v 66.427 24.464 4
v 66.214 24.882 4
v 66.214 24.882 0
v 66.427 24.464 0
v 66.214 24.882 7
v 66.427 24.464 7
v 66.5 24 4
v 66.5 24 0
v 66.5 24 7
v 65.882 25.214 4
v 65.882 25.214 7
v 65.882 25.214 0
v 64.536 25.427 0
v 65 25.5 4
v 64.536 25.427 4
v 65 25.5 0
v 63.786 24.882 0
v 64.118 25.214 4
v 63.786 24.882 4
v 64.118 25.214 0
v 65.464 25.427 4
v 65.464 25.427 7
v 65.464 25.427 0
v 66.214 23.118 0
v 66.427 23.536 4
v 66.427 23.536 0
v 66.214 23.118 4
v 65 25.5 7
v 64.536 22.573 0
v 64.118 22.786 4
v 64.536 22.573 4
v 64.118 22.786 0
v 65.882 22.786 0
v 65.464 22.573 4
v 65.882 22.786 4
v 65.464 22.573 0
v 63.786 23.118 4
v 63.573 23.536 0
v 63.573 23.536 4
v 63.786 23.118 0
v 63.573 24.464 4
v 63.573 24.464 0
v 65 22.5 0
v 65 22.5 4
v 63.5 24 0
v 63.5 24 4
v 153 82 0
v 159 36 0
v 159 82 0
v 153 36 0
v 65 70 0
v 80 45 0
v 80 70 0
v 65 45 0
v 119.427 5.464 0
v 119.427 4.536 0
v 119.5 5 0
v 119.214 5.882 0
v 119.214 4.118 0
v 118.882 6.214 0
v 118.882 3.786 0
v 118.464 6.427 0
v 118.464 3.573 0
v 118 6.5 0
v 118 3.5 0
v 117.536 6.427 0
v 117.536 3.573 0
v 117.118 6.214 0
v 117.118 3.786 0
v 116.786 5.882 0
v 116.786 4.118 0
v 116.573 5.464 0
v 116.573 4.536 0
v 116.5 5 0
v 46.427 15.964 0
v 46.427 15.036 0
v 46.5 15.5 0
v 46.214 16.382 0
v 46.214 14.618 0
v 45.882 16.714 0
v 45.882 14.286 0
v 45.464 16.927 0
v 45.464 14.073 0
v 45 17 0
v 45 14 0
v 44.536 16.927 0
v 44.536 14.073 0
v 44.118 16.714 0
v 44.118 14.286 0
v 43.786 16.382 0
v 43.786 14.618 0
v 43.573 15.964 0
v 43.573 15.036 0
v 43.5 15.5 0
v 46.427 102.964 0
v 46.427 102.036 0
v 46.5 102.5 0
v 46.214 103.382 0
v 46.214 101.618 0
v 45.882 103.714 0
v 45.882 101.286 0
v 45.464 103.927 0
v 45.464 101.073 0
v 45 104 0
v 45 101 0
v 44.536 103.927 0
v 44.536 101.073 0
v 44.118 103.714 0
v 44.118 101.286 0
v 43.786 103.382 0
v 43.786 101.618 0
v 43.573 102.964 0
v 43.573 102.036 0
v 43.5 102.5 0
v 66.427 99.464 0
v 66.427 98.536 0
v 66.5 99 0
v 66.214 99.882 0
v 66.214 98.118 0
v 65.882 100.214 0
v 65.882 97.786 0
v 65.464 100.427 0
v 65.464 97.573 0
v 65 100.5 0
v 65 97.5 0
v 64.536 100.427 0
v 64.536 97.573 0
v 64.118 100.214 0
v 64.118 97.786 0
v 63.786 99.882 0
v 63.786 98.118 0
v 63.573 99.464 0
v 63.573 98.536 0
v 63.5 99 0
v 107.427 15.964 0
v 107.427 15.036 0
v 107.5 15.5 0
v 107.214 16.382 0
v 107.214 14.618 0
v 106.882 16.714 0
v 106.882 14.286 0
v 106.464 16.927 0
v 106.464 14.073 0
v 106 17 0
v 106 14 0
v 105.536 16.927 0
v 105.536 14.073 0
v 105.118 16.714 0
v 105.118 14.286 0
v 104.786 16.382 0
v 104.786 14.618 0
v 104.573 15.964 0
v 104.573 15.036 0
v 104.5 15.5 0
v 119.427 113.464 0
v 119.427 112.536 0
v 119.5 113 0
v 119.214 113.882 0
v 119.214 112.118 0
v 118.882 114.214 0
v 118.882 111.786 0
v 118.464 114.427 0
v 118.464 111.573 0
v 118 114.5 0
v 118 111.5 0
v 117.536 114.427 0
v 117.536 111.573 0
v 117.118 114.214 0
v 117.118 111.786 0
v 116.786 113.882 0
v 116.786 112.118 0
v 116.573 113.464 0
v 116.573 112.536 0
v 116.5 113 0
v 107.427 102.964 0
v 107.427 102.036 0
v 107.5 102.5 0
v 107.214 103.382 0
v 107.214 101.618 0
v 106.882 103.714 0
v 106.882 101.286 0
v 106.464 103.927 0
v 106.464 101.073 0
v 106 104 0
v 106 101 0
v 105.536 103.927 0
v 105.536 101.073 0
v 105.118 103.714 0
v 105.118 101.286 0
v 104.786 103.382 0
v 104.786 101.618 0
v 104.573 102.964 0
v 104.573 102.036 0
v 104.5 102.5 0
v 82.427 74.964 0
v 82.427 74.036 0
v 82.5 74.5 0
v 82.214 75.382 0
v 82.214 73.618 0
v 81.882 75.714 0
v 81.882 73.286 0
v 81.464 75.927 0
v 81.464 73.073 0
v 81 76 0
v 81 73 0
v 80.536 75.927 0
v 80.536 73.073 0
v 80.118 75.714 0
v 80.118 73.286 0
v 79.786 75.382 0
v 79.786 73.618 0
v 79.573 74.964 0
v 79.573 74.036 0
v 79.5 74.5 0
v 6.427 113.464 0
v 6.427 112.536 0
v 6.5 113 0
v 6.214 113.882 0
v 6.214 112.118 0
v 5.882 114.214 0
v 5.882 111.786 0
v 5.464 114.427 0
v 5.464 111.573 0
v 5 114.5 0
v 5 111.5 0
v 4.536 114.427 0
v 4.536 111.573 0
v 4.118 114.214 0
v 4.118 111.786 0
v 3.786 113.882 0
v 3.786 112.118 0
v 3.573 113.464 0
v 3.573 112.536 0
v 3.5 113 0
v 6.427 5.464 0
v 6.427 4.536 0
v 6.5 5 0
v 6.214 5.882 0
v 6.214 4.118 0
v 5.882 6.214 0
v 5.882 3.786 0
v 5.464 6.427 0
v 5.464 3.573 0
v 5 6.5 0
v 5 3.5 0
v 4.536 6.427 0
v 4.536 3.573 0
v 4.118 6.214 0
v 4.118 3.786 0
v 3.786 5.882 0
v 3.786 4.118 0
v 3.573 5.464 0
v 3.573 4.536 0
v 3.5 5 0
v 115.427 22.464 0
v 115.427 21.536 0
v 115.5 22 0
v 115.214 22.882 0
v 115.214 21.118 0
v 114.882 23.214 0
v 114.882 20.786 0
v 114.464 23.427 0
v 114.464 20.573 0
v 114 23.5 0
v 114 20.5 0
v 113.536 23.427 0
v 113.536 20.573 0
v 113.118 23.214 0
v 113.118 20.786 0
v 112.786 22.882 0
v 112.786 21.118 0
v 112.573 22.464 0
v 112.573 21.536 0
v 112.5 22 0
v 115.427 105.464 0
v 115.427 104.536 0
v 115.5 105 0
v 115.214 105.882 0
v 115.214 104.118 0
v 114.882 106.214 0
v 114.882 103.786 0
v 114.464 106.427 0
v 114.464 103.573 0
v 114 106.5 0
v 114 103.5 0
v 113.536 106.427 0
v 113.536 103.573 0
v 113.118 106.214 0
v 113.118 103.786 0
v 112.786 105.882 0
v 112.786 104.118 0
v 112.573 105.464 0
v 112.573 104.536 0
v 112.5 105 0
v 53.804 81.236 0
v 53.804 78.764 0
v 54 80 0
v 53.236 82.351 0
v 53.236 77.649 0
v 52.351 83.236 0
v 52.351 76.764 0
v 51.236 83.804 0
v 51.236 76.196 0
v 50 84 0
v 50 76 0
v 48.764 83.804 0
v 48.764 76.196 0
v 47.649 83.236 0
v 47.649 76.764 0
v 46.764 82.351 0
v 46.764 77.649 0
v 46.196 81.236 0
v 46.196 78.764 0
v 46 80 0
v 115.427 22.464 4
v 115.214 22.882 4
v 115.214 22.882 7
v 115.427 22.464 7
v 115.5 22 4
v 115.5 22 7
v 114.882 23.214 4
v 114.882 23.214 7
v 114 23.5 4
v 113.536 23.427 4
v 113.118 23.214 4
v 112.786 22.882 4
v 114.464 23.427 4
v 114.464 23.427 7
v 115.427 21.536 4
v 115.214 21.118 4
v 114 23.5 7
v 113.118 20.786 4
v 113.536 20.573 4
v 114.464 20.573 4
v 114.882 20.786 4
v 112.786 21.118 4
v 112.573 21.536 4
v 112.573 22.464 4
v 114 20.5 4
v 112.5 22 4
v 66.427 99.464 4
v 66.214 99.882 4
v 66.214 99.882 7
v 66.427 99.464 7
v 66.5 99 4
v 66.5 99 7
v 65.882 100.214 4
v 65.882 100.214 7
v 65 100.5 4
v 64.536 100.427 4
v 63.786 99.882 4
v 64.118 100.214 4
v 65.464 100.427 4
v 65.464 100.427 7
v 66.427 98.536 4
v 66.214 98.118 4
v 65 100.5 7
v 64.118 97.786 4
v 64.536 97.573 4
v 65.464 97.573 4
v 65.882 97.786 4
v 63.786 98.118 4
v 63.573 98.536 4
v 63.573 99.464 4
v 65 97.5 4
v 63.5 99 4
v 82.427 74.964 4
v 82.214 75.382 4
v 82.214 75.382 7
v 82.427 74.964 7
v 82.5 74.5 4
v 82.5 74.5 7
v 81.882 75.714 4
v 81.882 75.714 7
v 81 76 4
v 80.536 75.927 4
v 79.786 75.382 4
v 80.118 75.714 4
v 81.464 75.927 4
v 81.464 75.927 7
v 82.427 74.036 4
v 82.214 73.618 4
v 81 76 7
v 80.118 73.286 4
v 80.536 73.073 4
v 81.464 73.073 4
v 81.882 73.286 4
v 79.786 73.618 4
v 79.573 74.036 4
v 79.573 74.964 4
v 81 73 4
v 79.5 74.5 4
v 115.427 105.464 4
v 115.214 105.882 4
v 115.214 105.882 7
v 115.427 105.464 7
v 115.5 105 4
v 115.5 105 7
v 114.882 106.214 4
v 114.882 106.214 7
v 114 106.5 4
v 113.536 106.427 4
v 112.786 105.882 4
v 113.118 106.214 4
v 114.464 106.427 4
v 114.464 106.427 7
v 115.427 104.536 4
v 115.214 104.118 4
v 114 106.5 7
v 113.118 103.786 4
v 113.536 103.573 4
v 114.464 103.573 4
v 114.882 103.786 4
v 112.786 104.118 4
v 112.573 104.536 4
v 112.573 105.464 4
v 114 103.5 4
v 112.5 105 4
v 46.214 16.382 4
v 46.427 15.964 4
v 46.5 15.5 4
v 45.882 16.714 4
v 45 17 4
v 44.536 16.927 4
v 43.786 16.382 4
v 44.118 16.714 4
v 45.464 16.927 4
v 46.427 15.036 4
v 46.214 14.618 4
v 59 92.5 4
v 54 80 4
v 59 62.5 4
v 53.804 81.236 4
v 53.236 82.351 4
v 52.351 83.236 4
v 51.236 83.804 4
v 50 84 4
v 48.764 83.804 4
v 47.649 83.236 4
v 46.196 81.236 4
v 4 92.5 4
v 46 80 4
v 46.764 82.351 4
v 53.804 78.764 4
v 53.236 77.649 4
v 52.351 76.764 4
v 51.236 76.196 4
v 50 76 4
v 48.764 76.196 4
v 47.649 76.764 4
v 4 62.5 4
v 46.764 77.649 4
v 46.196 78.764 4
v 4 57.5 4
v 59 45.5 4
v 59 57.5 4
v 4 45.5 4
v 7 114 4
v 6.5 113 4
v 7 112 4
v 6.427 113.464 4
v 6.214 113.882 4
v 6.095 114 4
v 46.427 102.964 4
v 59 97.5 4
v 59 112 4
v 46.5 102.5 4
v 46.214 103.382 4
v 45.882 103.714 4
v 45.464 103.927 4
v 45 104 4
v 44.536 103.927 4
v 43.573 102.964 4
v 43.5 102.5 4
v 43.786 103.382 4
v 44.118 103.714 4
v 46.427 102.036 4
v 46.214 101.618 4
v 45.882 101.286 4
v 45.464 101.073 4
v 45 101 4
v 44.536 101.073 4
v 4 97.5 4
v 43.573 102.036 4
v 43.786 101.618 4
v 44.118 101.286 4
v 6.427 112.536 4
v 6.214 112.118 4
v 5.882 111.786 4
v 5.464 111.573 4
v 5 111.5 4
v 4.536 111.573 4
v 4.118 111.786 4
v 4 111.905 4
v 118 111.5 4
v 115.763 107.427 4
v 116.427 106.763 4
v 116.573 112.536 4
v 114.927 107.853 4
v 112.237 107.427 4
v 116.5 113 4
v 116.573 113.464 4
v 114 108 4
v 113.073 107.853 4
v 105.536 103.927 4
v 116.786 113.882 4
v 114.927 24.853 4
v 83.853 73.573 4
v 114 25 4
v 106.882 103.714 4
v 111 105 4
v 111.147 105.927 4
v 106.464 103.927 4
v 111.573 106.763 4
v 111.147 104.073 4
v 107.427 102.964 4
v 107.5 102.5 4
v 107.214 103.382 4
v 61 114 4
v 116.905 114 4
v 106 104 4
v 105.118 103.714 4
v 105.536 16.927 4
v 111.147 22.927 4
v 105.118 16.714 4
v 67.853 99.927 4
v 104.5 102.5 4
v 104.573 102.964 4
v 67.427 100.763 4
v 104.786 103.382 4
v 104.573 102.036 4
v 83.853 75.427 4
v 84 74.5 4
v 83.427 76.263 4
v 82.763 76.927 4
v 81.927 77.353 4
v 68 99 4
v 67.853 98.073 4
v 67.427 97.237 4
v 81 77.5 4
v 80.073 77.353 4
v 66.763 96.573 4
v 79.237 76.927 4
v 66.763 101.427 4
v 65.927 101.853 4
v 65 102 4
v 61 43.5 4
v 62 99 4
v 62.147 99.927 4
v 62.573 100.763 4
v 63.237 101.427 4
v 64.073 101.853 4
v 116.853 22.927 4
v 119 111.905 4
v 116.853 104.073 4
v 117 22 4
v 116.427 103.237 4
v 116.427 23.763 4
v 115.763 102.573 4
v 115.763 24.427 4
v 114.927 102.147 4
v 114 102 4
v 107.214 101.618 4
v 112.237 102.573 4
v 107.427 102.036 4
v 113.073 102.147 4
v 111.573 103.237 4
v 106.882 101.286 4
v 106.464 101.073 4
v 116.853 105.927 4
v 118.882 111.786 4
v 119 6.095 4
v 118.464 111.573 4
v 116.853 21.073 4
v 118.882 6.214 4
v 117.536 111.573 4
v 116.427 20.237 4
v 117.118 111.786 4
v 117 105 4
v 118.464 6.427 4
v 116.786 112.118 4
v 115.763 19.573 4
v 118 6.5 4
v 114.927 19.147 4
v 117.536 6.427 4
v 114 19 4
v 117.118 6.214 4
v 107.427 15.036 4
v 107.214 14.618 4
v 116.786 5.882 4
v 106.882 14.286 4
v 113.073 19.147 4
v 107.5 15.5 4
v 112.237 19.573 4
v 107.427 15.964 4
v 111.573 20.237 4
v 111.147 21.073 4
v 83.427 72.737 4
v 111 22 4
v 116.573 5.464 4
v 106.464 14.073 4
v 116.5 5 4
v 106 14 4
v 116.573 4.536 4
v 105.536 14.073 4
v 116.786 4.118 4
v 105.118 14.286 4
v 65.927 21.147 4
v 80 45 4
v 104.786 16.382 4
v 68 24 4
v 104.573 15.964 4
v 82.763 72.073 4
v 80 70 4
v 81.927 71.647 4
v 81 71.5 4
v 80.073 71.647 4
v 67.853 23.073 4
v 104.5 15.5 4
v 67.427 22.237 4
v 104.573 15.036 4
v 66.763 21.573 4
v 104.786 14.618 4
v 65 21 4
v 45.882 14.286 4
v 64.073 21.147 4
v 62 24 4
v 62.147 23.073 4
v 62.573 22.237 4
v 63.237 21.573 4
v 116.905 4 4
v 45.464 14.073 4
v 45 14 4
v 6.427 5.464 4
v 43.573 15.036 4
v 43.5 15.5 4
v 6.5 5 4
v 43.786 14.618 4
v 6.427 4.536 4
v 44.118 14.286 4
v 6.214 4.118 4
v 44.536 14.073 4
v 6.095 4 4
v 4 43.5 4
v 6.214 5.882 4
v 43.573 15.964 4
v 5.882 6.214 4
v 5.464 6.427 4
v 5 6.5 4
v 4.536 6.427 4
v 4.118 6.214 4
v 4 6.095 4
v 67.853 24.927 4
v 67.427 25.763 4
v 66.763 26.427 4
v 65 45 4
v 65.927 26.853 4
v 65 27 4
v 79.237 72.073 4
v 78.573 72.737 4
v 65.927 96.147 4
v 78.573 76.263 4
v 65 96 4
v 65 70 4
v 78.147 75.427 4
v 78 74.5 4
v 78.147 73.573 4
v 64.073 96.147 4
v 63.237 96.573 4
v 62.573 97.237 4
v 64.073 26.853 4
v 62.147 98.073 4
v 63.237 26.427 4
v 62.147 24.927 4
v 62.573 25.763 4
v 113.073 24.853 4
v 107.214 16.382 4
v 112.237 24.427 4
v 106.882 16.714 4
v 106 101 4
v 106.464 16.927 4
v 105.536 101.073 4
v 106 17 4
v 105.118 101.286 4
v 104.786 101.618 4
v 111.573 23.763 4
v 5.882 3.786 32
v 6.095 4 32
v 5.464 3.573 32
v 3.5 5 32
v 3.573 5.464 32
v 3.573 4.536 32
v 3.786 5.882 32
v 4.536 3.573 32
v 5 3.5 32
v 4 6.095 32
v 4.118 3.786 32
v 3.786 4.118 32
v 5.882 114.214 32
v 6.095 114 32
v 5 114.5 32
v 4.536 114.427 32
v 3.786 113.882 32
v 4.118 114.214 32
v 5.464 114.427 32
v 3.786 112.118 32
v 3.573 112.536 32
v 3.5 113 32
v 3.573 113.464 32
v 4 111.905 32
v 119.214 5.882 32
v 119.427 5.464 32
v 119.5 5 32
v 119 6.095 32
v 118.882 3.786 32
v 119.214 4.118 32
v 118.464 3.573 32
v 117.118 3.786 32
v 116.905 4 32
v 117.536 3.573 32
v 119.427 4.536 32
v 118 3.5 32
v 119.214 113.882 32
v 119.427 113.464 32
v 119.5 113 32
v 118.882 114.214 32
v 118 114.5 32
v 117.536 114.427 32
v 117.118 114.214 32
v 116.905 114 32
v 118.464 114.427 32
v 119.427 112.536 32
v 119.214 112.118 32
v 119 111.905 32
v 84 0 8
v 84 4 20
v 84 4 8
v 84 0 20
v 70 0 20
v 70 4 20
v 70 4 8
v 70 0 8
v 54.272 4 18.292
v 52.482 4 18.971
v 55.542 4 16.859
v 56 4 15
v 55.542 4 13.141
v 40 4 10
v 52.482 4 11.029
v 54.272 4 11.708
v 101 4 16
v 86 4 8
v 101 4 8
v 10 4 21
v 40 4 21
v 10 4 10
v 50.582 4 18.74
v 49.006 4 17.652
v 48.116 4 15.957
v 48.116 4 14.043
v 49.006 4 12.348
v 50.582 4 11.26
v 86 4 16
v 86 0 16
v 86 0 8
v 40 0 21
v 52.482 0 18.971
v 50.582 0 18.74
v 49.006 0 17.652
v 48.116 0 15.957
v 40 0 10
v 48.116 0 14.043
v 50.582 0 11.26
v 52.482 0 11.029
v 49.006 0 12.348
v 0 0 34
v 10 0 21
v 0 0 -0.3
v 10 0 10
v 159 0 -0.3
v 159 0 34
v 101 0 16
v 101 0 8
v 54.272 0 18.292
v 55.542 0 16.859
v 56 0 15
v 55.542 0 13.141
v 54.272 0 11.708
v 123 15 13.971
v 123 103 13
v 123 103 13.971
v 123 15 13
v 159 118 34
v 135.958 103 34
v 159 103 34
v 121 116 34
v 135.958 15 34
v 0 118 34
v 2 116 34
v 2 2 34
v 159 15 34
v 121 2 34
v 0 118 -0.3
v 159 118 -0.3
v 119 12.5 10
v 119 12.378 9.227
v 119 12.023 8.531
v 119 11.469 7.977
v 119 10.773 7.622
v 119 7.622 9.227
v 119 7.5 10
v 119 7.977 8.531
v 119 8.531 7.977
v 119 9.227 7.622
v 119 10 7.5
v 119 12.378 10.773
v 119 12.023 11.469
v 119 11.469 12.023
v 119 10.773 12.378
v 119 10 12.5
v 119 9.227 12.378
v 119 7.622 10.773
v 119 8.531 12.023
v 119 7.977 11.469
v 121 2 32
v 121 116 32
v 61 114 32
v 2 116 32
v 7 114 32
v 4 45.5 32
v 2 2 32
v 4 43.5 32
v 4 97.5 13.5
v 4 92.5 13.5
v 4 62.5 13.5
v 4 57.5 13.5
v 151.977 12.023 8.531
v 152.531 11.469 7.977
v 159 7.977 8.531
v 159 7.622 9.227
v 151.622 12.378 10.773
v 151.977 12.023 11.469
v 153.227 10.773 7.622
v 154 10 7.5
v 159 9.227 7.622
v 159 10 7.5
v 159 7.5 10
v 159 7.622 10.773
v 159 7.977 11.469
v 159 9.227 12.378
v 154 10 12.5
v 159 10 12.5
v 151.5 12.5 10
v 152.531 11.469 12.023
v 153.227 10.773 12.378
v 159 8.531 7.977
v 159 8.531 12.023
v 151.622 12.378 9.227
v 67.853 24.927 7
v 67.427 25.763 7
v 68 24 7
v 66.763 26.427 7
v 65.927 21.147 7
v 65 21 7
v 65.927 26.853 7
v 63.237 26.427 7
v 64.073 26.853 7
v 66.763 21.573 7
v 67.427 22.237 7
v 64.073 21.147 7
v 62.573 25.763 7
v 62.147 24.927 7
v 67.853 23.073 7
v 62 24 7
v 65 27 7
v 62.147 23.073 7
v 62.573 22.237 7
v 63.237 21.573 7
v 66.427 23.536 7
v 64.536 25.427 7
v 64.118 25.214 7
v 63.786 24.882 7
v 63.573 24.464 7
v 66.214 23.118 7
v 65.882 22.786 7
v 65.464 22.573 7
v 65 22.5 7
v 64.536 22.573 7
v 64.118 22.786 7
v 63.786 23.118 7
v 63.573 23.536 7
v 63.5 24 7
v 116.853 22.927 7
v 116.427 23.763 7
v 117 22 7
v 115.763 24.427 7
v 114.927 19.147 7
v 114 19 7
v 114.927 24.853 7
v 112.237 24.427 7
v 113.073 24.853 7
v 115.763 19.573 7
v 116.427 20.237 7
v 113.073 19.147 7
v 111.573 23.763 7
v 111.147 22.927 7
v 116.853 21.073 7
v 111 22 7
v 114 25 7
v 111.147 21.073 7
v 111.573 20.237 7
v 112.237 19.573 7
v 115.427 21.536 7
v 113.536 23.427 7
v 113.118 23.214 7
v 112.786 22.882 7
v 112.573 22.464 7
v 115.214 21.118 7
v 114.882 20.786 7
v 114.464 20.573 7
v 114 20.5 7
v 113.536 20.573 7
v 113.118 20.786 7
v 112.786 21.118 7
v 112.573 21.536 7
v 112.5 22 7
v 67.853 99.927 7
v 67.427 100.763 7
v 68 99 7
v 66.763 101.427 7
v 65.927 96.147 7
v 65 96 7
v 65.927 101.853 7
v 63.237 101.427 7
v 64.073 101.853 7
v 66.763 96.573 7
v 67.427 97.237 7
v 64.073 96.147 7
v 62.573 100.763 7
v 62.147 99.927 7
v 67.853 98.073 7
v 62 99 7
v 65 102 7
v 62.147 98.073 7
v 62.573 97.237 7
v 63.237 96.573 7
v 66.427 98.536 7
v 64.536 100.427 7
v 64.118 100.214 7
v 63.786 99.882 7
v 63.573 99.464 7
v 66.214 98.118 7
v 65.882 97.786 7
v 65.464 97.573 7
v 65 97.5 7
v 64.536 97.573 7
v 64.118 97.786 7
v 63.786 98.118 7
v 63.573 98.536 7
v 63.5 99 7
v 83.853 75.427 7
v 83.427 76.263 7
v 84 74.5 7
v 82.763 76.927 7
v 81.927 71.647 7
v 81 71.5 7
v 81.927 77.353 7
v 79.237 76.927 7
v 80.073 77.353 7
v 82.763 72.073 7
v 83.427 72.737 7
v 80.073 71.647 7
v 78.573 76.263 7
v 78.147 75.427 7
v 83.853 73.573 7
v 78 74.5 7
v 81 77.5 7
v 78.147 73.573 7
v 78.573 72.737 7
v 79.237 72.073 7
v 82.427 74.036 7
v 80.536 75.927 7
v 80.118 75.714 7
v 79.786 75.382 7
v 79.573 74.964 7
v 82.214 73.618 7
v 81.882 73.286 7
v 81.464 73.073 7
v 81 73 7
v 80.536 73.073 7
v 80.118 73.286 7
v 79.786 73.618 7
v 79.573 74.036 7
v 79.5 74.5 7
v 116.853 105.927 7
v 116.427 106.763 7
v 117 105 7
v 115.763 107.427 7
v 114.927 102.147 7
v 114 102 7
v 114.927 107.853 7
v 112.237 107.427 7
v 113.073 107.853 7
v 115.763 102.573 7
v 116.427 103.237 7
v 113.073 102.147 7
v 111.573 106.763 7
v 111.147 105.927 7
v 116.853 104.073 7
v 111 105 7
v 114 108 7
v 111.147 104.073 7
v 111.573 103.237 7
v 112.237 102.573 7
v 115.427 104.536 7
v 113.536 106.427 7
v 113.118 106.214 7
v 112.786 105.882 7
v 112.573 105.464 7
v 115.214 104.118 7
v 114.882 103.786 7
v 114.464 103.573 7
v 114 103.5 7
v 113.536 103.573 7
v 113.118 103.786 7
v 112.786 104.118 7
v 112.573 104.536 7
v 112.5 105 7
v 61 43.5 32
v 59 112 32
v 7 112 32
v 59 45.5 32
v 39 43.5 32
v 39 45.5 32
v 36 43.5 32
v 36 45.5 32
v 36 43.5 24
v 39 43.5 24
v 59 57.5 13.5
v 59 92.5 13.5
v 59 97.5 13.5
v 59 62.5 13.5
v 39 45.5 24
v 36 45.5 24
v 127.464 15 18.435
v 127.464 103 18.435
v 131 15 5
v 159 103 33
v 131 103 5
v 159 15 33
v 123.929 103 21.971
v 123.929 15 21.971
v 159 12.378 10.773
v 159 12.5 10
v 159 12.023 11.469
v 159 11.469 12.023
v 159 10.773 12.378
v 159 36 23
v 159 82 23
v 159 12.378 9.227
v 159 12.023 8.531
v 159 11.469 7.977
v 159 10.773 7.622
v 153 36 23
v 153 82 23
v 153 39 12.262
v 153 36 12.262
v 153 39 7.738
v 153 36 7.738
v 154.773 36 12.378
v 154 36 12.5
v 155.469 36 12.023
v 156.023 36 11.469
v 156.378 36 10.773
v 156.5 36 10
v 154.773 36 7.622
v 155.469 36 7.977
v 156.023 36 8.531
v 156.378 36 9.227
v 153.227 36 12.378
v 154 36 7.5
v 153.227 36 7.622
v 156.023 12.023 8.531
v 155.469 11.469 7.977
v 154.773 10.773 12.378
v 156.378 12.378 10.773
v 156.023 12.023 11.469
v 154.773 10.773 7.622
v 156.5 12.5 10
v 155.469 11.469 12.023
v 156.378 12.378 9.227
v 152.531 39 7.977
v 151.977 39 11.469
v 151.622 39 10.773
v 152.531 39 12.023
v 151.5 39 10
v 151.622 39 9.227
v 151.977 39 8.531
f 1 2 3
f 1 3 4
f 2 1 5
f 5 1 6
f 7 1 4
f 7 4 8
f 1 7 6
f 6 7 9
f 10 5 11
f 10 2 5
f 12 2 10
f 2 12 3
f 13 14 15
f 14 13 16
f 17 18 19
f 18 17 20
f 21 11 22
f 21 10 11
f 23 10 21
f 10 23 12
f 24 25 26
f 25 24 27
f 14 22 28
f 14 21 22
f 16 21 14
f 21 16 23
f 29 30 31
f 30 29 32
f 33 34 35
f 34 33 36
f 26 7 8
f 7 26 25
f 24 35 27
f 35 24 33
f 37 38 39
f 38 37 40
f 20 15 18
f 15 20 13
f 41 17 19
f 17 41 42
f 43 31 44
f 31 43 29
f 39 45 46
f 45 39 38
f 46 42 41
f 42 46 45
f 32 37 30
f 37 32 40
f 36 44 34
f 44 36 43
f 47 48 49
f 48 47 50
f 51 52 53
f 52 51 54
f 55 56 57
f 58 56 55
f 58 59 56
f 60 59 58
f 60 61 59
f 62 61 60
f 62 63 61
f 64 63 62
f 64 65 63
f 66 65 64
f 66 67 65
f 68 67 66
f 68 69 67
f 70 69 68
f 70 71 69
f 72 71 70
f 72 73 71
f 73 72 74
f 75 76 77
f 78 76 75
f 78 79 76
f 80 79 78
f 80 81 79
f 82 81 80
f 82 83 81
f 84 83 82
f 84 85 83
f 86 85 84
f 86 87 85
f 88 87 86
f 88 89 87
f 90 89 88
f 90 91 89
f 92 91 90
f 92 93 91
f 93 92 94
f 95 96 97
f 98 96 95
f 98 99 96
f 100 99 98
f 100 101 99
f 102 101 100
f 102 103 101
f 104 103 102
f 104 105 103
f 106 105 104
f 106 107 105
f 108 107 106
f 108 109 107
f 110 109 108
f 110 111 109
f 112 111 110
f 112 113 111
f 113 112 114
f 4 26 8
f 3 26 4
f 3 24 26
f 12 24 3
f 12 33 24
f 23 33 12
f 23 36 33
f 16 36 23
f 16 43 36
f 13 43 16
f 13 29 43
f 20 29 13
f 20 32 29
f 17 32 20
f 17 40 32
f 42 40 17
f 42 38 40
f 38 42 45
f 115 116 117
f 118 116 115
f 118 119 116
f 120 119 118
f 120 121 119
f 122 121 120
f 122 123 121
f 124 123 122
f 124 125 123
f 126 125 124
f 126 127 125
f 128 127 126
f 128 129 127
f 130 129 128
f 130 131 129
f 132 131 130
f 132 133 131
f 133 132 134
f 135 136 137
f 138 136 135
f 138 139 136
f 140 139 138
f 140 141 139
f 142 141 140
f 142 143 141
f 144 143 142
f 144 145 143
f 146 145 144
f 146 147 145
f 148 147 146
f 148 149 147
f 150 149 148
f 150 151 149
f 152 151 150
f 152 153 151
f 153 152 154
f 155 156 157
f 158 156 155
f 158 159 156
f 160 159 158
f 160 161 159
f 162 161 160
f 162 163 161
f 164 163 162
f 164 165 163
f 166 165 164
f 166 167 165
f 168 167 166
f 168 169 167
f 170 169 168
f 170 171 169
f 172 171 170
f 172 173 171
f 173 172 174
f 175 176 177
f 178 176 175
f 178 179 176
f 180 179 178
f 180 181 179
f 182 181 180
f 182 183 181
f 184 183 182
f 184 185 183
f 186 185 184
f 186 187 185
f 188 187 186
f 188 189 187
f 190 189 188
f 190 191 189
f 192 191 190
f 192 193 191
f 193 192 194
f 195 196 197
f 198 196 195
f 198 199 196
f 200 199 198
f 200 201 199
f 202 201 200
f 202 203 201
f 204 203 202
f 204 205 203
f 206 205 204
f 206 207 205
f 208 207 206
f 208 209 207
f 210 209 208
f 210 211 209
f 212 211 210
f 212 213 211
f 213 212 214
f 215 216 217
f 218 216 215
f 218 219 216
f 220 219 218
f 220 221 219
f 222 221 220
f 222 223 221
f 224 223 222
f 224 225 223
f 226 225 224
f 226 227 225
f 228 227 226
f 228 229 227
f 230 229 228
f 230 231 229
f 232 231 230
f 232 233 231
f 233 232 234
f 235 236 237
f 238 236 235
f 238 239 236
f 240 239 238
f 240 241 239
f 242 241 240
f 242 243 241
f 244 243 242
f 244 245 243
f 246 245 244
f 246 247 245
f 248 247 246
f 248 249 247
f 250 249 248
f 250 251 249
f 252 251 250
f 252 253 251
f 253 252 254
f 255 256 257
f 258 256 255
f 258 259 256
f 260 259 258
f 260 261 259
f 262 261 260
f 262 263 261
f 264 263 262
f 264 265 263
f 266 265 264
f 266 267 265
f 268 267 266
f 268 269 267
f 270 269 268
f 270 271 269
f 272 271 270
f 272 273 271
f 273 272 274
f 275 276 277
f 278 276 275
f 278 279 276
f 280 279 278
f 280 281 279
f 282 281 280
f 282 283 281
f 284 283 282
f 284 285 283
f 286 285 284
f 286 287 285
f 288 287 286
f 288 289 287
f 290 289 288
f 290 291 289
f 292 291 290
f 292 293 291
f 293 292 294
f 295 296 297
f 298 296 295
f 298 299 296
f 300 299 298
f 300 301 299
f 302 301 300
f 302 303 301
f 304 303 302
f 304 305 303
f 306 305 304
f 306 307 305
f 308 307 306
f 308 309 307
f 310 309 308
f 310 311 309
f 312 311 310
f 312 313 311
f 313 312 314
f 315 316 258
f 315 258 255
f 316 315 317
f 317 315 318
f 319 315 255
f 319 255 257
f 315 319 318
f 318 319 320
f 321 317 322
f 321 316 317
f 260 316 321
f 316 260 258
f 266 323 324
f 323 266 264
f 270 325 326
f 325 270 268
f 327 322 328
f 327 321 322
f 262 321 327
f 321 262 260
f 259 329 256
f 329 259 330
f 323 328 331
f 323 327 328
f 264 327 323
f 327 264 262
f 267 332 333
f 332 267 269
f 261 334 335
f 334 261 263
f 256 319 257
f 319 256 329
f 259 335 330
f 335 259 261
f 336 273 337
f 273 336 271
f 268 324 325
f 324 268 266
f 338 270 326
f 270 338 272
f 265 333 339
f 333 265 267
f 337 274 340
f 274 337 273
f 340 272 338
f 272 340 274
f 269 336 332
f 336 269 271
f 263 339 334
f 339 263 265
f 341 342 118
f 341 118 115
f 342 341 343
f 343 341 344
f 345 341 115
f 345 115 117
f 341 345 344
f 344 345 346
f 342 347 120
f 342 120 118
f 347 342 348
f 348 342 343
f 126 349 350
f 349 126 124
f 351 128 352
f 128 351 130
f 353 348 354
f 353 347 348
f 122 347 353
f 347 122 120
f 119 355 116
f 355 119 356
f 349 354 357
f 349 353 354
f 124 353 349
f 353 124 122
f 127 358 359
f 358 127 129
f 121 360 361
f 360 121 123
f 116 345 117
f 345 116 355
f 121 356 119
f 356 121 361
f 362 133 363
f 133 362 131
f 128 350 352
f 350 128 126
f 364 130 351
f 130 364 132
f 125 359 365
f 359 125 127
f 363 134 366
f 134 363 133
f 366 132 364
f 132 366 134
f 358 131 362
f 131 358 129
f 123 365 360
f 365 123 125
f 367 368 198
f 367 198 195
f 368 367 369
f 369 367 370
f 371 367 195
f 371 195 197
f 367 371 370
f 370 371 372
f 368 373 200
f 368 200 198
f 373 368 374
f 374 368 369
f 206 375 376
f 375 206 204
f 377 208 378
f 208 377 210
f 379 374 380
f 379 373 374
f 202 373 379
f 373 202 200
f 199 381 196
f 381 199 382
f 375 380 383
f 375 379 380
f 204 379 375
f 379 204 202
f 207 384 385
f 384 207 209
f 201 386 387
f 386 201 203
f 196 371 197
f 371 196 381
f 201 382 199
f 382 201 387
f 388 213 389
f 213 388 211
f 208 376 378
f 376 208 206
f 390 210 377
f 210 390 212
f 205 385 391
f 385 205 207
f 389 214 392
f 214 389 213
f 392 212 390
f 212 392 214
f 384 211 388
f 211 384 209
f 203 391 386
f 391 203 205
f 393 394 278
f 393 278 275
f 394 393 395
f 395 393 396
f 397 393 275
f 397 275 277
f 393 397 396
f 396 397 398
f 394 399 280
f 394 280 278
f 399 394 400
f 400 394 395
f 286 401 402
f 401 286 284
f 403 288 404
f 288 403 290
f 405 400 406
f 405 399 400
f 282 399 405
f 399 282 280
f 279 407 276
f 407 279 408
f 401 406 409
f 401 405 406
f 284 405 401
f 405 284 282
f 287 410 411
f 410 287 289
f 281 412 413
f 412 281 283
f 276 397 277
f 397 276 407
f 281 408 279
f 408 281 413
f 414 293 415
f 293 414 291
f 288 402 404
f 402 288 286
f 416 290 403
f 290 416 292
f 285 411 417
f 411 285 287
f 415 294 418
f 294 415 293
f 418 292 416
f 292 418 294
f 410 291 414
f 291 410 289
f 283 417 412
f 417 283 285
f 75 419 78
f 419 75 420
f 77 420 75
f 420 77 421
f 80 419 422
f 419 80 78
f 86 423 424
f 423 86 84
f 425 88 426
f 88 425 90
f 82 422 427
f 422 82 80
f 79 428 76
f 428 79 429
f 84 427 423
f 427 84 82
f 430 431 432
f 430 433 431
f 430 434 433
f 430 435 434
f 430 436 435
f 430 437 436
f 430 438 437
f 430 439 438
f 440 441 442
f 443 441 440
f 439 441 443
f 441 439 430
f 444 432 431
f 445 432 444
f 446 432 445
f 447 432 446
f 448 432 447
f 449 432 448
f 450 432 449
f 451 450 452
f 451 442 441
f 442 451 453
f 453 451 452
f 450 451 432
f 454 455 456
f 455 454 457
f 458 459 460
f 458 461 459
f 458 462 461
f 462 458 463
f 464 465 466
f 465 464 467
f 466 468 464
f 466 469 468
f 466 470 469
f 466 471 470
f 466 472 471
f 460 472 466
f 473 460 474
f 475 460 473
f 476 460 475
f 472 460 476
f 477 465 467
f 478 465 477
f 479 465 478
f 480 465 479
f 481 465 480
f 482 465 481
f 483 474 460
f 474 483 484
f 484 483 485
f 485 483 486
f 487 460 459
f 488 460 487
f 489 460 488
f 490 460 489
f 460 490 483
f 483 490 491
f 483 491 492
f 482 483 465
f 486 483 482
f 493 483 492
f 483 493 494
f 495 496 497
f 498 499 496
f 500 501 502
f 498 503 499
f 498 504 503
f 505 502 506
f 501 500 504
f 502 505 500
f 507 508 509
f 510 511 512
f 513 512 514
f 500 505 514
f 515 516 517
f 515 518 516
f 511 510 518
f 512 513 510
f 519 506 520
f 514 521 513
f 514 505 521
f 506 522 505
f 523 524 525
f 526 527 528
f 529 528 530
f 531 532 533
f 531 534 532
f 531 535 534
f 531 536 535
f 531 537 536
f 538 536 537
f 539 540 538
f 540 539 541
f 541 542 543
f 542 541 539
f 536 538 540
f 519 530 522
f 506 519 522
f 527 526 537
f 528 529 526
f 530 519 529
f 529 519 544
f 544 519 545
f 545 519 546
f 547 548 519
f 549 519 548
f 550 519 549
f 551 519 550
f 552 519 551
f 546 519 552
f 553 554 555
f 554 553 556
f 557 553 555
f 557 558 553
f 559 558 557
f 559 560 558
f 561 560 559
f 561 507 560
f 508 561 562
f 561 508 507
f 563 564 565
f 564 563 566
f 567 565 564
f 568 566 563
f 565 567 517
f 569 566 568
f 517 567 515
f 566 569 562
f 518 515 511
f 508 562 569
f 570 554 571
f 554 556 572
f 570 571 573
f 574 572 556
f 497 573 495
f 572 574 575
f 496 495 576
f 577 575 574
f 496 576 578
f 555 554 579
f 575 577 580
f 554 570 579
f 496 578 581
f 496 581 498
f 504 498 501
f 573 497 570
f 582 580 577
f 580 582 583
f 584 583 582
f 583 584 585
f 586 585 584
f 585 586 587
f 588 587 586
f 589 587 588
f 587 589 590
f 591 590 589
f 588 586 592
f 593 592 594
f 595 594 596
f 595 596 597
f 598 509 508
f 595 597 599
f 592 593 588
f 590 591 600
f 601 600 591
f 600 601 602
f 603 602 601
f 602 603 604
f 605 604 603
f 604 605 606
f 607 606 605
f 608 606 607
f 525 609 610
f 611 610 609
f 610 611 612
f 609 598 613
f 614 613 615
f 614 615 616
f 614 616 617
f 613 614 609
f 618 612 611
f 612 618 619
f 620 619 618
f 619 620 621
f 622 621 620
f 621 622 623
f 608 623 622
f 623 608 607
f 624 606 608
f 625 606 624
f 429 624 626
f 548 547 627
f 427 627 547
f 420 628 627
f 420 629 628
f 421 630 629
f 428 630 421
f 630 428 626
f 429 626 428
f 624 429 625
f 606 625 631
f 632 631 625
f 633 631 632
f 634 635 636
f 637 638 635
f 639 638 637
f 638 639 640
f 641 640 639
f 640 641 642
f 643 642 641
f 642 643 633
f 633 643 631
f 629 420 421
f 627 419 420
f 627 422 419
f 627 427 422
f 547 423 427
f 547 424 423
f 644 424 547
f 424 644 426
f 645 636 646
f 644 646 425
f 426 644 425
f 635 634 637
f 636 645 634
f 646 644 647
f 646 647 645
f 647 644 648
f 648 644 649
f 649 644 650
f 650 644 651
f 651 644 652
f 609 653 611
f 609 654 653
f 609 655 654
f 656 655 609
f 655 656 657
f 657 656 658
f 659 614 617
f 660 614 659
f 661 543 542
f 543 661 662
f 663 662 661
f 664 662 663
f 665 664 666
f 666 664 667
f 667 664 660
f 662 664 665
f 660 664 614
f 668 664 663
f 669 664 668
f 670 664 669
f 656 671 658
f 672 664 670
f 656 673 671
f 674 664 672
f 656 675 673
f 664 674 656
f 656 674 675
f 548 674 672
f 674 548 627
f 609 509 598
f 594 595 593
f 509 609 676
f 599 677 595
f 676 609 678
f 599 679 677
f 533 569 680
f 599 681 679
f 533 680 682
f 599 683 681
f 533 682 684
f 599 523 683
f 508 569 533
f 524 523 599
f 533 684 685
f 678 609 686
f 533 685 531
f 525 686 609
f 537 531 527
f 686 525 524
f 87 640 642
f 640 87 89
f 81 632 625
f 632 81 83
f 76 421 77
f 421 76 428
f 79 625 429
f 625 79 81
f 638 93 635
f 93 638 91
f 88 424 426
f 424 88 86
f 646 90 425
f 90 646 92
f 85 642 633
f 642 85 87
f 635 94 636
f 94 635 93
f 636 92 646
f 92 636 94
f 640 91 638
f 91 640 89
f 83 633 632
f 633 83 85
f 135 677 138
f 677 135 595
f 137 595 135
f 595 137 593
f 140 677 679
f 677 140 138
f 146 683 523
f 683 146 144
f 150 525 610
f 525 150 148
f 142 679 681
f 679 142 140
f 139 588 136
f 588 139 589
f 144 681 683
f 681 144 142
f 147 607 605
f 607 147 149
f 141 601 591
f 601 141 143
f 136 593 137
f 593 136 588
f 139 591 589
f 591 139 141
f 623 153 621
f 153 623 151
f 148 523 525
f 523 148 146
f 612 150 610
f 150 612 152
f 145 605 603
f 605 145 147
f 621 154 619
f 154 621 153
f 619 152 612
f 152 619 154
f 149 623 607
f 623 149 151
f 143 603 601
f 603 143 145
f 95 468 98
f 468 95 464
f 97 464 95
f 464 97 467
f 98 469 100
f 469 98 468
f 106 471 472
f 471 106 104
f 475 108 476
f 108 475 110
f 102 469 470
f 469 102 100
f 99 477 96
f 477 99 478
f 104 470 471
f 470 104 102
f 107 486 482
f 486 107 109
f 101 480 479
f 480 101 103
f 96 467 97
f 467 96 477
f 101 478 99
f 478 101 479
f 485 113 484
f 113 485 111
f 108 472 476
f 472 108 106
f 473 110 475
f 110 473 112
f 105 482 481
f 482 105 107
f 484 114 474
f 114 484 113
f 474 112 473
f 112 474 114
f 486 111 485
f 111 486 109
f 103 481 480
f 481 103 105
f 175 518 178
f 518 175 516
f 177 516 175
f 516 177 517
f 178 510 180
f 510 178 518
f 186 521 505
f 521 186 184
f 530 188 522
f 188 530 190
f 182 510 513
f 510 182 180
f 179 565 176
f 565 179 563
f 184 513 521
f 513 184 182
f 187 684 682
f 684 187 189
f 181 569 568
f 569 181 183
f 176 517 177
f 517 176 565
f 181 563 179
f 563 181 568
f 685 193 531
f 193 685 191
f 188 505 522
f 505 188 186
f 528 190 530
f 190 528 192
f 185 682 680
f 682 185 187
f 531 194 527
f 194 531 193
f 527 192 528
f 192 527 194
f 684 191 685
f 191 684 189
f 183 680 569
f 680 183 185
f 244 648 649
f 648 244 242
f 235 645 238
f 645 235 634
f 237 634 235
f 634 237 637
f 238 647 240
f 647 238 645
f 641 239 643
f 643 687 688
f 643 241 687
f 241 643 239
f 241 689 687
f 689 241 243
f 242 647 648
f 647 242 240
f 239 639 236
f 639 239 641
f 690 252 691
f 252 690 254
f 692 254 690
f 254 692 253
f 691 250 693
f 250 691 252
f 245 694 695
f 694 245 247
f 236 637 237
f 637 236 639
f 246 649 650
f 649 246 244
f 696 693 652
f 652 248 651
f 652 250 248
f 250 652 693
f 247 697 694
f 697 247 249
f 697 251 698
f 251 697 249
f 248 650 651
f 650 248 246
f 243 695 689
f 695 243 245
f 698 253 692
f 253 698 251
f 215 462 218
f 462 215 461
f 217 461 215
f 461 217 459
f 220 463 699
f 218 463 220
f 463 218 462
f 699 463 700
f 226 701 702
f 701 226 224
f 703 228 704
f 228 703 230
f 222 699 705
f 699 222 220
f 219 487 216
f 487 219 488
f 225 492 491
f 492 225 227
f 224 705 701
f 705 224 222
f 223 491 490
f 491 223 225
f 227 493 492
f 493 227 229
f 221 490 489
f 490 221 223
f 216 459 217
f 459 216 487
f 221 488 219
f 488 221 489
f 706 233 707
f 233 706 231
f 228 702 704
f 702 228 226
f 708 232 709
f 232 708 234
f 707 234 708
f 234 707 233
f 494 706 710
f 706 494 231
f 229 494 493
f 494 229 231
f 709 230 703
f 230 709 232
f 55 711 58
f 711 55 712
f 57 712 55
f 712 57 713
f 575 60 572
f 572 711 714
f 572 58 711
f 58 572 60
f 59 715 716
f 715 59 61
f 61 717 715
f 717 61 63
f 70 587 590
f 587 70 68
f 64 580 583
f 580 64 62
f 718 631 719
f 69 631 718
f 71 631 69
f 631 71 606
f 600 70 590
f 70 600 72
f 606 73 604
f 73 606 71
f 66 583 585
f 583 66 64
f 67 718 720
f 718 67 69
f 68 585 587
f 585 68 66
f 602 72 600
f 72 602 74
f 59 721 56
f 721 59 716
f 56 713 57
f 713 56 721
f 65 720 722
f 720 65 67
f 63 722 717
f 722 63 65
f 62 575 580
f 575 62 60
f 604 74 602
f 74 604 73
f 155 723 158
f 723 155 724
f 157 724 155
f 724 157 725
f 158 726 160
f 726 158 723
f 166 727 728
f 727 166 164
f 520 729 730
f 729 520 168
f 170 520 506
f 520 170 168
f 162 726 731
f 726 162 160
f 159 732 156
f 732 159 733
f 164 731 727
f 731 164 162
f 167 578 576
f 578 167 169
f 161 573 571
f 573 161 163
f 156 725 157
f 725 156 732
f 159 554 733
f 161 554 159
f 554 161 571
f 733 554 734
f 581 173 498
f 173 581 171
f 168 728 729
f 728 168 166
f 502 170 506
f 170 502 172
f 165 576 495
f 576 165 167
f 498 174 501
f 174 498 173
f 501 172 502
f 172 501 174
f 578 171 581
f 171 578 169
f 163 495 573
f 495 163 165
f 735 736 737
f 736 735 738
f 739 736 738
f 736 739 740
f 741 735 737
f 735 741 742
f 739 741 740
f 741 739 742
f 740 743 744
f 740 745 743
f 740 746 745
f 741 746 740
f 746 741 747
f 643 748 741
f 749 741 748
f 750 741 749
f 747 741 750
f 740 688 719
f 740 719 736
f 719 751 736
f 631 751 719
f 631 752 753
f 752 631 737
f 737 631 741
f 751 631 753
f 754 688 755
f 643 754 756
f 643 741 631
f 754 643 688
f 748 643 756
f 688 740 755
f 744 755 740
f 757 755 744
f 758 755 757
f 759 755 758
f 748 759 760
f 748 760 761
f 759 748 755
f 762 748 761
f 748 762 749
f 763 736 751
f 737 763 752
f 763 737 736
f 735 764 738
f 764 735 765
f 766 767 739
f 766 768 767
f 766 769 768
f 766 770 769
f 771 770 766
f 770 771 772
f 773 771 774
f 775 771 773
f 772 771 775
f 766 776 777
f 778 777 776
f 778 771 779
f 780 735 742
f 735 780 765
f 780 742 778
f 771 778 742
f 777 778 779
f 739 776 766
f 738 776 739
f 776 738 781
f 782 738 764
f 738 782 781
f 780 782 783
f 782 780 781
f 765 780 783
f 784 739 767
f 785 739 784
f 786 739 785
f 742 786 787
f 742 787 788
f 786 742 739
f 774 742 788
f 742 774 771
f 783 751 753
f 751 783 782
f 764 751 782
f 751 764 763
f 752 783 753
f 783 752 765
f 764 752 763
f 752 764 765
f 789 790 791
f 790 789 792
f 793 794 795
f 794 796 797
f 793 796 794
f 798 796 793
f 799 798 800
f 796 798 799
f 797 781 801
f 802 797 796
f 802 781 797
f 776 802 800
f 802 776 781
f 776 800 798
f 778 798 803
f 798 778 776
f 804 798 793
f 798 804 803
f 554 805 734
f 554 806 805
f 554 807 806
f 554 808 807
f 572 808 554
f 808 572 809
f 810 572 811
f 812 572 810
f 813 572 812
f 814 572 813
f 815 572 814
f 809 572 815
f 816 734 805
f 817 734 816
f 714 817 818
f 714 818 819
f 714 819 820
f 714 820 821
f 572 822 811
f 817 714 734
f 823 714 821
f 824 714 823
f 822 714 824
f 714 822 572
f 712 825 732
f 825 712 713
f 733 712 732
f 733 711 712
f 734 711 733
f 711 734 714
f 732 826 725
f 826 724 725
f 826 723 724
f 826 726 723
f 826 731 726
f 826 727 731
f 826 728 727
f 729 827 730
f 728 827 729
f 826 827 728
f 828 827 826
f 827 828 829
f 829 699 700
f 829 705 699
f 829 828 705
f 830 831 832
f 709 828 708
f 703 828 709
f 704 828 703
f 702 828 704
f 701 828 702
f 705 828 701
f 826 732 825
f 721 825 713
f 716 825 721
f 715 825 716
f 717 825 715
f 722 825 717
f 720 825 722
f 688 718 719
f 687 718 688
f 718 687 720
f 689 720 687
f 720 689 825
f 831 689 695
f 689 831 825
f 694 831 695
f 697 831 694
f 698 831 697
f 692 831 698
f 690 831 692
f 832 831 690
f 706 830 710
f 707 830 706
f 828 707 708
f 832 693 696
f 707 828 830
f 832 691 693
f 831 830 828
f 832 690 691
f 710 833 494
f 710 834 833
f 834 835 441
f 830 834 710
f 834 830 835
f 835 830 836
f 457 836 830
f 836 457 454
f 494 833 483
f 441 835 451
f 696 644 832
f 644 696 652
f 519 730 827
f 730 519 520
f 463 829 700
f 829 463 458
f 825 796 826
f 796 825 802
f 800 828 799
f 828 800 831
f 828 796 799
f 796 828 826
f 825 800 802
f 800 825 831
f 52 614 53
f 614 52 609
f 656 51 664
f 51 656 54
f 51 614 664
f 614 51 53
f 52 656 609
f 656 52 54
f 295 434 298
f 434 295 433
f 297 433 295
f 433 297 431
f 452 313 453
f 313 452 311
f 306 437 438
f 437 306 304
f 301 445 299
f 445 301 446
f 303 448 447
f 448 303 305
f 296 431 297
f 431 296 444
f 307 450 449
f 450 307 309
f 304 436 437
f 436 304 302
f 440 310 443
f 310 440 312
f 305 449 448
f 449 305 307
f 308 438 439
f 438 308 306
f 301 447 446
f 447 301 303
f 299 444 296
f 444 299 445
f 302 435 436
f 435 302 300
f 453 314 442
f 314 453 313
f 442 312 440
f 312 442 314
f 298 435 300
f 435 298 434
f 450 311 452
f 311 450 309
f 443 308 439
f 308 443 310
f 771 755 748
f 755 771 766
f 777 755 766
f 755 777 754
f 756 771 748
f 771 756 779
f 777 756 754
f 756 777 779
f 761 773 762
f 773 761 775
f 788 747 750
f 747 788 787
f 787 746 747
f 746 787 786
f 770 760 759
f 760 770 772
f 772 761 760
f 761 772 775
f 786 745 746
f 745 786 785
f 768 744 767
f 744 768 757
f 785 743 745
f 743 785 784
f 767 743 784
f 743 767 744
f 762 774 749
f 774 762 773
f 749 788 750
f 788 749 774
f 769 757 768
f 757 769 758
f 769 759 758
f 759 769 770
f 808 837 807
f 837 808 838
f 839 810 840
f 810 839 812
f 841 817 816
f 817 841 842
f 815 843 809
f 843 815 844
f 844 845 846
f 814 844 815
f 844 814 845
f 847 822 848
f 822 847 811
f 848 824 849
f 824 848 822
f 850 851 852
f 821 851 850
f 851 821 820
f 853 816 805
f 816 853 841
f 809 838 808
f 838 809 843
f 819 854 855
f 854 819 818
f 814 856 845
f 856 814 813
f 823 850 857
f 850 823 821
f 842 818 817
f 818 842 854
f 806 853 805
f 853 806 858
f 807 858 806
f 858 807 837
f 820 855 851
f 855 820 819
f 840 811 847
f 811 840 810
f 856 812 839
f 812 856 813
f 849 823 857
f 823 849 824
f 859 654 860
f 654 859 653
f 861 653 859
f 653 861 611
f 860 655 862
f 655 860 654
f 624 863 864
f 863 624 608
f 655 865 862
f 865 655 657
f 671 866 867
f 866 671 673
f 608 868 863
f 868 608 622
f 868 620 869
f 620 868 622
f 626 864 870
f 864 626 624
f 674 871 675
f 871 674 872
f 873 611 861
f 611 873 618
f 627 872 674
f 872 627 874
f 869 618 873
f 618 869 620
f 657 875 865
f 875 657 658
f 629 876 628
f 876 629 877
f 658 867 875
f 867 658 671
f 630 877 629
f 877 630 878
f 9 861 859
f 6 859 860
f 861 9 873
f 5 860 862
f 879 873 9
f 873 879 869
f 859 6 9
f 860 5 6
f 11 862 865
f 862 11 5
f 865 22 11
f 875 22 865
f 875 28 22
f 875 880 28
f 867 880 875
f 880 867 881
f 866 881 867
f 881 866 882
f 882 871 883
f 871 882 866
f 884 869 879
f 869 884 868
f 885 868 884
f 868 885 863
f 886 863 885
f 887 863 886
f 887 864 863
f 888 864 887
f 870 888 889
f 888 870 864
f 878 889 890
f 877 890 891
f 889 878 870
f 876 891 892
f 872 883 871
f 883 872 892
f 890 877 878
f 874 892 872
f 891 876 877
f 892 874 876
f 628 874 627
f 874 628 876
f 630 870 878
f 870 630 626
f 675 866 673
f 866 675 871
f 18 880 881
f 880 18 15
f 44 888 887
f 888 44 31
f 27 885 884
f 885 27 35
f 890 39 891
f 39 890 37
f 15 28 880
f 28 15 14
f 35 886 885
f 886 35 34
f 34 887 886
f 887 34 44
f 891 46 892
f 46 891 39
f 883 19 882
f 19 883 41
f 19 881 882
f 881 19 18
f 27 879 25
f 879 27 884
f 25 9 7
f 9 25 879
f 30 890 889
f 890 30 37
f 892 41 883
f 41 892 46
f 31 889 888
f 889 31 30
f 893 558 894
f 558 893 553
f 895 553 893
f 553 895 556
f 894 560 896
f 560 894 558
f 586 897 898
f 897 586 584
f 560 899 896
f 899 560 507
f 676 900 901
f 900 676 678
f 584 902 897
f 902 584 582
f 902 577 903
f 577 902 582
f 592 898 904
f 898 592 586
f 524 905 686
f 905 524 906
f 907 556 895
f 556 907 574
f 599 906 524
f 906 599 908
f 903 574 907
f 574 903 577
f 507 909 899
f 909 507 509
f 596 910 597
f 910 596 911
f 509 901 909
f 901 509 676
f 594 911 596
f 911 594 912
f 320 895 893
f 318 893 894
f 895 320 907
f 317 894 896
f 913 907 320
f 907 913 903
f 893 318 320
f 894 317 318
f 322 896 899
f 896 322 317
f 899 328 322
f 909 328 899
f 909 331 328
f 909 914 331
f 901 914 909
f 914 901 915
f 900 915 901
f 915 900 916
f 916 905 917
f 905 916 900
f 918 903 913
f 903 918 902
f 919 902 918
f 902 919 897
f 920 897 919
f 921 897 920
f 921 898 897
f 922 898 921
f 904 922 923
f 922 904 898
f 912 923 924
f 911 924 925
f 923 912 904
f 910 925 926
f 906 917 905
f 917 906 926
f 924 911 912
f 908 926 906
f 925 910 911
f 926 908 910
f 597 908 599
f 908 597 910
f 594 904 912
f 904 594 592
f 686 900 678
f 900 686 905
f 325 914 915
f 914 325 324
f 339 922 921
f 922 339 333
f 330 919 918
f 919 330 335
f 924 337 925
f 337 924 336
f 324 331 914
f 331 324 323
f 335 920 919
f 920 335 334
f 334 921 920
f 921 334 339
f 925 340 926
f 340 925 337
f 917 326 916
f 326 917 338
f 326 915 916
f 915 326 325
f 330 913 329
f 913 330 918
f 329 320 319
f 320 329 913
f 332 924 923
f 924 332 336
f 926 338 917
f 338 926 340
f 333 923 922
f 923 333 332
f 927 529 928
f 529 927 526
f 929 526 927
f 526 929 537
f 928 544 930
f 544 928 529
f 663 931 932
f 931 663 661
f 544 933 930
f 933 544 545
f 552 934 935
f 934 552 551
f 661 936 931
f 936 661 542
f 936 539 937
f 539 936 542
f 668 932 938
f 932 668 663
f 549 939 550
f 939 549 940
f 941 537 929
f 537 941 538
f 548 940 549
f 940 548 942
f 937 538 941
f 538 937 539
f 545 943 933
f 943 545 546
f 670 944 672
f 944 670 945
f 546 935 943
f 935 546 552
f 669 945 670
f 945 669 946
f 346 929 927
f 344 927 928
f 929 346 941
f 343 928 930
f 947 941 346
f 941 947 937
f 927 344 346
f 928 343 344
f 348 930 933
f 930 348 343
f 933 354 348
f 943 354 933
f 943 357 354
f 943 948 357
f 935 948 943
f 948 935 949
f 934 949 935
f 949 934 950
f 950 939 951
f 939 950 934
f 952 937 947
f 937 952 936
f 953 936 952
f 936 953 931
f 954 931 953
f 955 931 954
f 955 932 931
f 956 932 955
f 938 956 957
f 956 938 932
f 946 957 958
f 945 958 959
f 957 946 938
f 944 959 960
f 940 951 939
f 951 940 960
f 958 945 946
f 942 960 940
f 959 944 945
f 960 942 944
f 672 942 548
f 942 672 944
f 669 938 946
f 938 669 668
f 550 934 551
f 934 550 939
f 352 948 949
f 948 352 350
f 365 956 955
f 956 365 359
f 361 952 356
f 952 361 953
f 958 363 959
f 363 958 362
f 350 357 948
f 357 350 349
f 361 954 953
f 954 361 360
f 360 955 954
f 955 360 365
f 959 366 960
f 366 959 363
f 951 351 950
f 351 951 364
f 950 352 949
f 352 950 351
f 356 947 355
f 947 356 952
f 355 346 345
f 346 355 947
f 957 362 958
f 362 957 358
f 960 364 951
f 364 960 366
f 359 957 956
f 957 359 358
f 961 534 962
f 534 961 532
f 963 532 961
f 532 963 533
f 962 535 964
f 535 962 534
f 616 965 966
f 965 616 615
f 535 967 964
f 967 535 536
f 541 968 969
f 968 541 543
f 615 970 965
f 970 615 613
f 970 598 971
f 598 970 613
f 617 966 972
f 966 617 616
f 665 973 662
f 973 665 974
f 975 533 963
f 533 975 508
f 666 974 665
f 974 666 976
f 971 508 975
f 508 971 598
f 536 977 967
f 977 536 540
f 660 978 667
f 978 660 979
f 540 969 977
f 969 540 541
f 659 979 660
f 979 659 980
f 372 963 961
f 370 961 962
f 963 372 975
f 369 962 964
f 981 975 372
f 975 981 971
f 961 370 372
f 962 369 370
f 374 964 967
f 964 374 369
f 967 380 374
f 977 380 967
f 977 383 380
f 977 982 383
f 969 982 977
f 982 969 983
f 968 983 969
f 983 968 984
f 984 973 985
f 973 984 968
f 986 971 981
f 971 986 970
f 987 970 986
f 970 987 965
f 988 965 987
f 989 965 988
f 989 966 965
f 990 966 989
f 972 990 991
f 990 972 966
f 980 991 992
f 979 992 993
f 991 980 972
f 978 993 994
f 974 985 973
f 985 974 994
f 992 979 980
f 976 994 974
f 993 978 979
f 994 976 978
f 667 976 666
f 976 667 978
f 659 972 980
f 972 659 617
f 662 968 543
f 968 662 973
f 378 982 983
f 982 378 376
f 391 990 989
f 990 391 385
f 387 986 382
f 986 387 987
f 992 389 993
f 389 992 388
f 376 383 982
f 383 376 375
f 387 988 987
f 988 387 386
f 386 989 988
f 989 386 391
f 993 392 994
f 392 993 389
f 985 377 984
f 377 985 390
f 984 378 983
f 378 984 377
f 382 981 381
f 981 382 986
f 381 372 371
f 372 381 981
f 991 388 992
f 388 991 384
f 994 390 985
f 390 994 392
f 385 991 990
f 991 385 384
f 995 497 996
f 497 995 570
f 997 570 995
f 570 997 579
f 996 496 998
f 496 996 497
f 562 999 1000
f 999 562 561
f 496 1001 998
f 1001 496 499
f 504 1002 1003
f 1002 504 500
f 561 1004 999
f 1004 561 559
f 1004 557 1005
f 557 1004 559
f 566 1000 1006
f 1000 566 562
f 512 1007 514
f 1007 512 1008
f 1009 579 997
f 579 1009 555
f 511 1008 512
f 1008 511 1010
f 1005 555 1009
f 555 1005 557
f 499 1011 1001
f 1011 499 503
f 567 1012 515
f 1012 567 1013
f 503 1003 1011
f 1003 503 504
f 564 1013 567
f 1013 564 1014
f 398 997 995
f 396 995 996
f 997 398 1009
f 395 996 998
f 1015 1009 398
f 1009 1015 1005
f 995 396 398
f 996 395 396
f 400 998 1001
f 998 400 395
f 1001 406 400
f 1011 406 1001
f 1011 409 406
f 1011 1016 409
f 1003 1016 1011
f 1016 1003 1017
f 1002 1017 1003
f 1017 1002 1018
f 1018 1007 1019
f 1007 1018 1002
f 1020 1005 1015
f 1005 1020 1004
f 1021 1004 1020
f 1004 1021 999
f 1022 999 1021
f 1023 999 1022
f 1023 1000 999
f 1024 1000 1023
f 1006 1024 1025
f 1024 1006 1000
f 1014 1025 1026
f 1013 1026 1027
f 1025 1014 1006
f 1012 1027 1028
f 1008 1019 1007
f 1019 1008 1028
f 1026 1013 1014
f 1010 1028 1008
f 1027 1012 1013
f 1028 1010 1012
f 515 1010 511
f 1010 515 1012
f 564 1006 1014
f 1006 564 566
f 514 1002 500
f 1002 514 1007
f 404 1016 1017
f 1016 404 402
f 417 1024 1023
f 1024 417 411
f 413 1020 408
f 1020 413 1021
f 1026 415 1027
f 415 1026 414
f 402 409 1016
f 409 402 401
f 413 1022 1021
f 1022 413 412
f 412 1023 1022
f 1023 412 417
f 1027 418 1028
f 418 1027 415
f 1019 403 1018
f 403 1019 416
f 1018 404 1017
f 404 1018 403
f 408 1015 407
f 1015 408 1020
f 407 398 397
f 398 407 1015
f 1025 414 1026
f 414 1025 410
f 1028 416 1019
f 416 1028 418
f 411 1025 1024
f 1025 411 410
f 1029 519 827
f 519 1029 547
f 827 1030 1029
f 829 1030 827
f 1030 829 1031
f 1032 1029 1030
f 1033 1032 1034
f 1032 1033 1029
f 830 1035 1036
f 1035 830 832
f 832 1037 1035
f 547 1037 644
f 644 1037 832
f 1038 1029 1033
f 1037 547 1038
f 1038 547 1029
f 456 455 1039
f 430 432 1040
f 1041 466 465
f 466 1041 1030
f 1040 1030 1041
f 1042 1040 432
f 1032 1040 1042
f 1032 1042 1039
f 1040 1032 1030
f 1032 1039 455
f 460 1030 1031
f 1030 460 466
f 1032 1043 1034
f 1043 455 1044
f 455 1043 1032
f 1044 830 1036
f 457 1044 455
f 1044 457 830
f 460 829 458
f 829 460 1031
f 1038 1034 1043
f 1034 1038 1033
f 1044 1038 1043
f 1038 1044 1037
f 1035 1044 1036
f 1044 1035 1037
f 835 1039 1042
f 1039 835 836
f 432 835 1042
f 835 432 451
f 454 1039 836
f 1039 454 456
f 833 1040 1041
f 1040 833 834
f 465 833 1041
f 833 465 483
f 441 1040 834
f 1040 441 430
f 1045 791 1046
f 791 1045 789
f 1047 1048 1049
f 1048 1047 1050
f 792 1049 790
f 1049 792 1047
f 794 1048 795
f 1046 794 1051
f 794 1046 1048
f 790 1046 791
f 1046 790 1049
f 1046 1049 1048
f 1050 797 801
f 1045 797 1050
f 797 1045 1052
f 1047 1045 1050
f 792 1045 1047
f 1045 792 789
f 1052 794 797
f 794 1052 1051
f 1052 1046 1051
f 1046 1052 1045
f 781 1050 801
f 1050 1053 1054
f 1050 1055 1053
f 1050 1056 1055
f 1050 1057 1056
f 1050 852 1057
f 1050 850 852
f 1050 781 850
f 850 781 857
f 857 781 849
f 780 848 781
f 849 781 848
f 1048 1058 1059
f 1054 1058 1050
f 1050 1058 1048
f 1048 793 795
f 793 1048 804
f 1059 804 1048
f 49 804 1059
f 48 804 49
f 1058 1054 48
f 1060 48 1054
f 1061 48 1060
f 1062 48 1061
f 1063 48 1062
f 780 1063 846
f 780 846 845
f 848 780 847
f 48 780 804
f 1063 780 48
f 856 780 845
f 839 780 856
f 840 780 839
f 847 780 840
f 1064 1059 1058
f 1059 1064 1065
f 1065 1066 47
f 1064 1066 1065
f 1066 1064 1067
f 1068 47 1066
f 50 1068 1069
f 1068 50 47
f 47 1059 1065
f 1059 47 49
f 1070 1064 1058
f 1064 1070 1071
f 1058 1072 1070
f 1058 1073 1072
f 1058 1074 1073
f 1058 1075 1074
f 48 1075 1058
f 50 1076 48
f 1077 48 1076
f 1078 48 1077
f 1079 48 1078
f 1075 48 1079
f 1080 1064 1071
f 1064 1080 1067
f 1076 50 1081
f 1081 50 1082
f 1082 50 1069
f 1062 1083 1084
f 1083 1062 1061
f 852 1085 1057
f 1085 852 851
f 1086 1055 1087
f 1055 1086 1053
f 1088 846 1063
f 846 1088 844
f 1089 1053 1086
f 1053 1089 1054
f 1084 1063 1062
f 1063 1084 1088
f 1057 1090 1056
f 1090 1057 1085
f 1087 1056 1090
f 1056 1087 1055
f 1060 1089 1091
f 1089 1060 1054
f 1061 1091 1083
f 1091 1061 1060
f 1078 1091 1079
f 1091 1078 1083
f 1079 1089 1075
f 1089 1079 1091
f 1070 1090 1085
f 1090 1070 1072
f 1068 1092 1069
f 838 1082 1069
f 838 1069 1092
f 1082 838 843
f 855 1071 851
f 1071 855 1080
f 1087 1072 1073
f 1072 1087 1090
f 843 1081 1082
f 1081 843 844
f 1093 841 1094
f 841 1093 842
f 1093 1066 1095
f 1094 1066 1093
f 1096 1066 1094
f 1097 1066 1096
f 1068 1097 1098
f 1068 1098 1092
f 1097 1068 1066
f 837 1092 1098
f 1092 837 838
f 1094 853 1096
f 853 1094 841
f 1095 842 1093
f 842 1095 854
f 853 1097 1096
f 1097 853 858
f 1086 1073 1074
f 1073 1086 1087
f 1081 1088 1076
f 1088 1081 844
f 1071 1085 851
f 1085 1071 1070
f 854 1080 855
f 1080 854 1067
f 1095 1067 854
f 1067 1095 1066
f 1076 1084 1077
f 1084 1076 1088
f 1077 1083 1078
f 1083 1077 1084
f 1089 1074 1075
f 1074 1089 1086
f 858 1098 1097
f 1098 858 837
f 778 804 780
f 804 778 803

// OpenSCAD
// Inner dimensions
length = 115;
width = 110;
height = 28;
thickness = 4;

// Quality
FN = 20;

// Battery Parameters
batteryLength = 66.5;
batteryWidth = 55.0;
batteryHeight = 18.5;

// Ultrasonic sensor
sensorLength = 46;
sensorDepth = 6;
sensorHeight = 23;

difference()
{
	// Outter cube
	cube([length+2*thickness, width+2*thickness, height+thickness+2]);

	// Inner cube
	translate([thickness, thickness, thickness])
	{
		cube([length, width, height]);
	}

	// Plexiglass tooth
	translate([2, 2, height+thickness])
	{
		cube([length+4, width+4, thickness]);
	}

	// h-bridge cable hole
	translate([65, 45, 0])
	{
		cube([15, 25, 5]);
	}

	// Component mounting holes
	translate([thickness, thickness, 0])
	{	
		screw_hole_component(61,20);
		screw_hole_component(110,18);
		screw_hole_component(61,95);
		screw_hole_component(77,70.5);
		screw_hole_component(110,101);
		
		screw_hole_base(41,11.5);
		screw_hole_base(102,11.5);
		screw_hole_base(41,98.5);
		screw_hole_base(102,98.5);

		// Plexi-Glass holes
		screw_hole_component(1,1);
		screw_hole_component(1,109);
		screw_hole_component(114,1);
		screw_hole_component(114,109);
		
	}

	// Battery removal hole
	translate([50, 80, 0]) cylinder(h = 5, r = 4, $fn = FN);

	// Power switch
	translate([10, 0, 10])
	{
		cube([30, thickness, 11]);
	}

	// Power plug
	translate([52, -1, 15])
	{
		rotate([-90, 0, 0]) cylinder(h = thickness+2, r = 4);
	}

	// Arduino holes
	translate([66+thickness, 0, 4+thickness])
	{
		cube([14, thickness, 12]);
	
		translate([16, 0, 0])
		{
			cube([15, thickness, 8]);
		}
	}

	// sensor wire hole
	translate([thickness+length-2, 10, 10])
	{
		rotate([0,90,0]) cylinder(h=8, r=2.5, $fn=FN);
	}

}

// Component spacers
translate([thickness, thickness, 0])
{	
	
	component_spacer(61,20);
	component_spacer(110,18);
	component_spacer(61,95);
	component_spacer(77,70.5);
	component_spacer(110,101);
	
}

// Battery holder & spacers
translate([thickness, thickness, thickness])
{
	translate([0, width-batteryLength-4, 0])
	{
		difference()
		{
			cube([batteryWidth+2, batteryLength+4, height]);
			translate([0, 2, 0]) cube([batteryWidth, batteryLength, height]);
			translate([0, batteryLength+1, 0]) cube([3, 3, height]);
			// cable hole
			translate([32,0,20]) cube([3,2,height-20]);
		}
	}
	translate([0, width-batteryLength+10, 0]) cube([batteryWidth, 5, height-batteryHeight]);
	translate([0, width-batteryLength+45, 0]) cube([batteryWidth, 5, height-batteryHeight]);

}

// Phone mount
phoneWidth = width+2*thickness;
phoneLength = 36;
phoneHeight = height +thickness+2;

translate([2*thickness+length, 0 ,0])
{

difference()
{
	cube([phoneLength, phoneWidth, phoneHeight]);
	translate([8, 15, 5]) rotate([0, -45, 0]) union()
	{
		cube([phoneLength+10, phoneWidth-30, 12]);
		translate([7,0,0]) cube([phoneLength+5, phoneWidth-30, 17]);
	}

	// button
	

	// Ultrasonic sensor
	translate([phoneLength - sensorDepth, phoneWidth/2 - sensorLength/2, 0]) cube([ sensorDepth, sensorLength, sensorHeight]);

	// Cables holes
	translate([-10, 10, 10]) rotate([0, 90, 0]) cylinder(h = phoneLength+12, r = 2.5, $fn = 20);
	translate([phoneLength-5, 10, 10]) rotate([-90, 0, 0]) cylinder(h = 29, r = 2.5, $fn = 20);

}
}

// base hack
translate([0,0,-0.3])
cube([length+2*thickness+phoneLength, width+2*thickness, 0.3]);


/******************************************************/

module screw_hole_component(x,y)
{
	translate([x, y])
	{
		cylinder(h = 35, r = 1.5, $fn = FN);
//		sphere(r = 2, $fn = FN);
	}
}

module component_spacer(x,y)
{
	translate([x, y, thickness])
	{
		difference()
		{
			cylinder(h = 3, r = 3.0, $fn = FN);
			cylinder(h = 3, r = 1.5, $fn = FN);
		}
	}
}

module screw_hole_base(x,y)
{
	translate([x, y])
	{
		union()
		{
			cylinder(h = thickness, r = 1.5, $fn = FN);
//			translate([0,0,thickness]) sphere(r = 2, $fn = FN);
		}
	}
}
